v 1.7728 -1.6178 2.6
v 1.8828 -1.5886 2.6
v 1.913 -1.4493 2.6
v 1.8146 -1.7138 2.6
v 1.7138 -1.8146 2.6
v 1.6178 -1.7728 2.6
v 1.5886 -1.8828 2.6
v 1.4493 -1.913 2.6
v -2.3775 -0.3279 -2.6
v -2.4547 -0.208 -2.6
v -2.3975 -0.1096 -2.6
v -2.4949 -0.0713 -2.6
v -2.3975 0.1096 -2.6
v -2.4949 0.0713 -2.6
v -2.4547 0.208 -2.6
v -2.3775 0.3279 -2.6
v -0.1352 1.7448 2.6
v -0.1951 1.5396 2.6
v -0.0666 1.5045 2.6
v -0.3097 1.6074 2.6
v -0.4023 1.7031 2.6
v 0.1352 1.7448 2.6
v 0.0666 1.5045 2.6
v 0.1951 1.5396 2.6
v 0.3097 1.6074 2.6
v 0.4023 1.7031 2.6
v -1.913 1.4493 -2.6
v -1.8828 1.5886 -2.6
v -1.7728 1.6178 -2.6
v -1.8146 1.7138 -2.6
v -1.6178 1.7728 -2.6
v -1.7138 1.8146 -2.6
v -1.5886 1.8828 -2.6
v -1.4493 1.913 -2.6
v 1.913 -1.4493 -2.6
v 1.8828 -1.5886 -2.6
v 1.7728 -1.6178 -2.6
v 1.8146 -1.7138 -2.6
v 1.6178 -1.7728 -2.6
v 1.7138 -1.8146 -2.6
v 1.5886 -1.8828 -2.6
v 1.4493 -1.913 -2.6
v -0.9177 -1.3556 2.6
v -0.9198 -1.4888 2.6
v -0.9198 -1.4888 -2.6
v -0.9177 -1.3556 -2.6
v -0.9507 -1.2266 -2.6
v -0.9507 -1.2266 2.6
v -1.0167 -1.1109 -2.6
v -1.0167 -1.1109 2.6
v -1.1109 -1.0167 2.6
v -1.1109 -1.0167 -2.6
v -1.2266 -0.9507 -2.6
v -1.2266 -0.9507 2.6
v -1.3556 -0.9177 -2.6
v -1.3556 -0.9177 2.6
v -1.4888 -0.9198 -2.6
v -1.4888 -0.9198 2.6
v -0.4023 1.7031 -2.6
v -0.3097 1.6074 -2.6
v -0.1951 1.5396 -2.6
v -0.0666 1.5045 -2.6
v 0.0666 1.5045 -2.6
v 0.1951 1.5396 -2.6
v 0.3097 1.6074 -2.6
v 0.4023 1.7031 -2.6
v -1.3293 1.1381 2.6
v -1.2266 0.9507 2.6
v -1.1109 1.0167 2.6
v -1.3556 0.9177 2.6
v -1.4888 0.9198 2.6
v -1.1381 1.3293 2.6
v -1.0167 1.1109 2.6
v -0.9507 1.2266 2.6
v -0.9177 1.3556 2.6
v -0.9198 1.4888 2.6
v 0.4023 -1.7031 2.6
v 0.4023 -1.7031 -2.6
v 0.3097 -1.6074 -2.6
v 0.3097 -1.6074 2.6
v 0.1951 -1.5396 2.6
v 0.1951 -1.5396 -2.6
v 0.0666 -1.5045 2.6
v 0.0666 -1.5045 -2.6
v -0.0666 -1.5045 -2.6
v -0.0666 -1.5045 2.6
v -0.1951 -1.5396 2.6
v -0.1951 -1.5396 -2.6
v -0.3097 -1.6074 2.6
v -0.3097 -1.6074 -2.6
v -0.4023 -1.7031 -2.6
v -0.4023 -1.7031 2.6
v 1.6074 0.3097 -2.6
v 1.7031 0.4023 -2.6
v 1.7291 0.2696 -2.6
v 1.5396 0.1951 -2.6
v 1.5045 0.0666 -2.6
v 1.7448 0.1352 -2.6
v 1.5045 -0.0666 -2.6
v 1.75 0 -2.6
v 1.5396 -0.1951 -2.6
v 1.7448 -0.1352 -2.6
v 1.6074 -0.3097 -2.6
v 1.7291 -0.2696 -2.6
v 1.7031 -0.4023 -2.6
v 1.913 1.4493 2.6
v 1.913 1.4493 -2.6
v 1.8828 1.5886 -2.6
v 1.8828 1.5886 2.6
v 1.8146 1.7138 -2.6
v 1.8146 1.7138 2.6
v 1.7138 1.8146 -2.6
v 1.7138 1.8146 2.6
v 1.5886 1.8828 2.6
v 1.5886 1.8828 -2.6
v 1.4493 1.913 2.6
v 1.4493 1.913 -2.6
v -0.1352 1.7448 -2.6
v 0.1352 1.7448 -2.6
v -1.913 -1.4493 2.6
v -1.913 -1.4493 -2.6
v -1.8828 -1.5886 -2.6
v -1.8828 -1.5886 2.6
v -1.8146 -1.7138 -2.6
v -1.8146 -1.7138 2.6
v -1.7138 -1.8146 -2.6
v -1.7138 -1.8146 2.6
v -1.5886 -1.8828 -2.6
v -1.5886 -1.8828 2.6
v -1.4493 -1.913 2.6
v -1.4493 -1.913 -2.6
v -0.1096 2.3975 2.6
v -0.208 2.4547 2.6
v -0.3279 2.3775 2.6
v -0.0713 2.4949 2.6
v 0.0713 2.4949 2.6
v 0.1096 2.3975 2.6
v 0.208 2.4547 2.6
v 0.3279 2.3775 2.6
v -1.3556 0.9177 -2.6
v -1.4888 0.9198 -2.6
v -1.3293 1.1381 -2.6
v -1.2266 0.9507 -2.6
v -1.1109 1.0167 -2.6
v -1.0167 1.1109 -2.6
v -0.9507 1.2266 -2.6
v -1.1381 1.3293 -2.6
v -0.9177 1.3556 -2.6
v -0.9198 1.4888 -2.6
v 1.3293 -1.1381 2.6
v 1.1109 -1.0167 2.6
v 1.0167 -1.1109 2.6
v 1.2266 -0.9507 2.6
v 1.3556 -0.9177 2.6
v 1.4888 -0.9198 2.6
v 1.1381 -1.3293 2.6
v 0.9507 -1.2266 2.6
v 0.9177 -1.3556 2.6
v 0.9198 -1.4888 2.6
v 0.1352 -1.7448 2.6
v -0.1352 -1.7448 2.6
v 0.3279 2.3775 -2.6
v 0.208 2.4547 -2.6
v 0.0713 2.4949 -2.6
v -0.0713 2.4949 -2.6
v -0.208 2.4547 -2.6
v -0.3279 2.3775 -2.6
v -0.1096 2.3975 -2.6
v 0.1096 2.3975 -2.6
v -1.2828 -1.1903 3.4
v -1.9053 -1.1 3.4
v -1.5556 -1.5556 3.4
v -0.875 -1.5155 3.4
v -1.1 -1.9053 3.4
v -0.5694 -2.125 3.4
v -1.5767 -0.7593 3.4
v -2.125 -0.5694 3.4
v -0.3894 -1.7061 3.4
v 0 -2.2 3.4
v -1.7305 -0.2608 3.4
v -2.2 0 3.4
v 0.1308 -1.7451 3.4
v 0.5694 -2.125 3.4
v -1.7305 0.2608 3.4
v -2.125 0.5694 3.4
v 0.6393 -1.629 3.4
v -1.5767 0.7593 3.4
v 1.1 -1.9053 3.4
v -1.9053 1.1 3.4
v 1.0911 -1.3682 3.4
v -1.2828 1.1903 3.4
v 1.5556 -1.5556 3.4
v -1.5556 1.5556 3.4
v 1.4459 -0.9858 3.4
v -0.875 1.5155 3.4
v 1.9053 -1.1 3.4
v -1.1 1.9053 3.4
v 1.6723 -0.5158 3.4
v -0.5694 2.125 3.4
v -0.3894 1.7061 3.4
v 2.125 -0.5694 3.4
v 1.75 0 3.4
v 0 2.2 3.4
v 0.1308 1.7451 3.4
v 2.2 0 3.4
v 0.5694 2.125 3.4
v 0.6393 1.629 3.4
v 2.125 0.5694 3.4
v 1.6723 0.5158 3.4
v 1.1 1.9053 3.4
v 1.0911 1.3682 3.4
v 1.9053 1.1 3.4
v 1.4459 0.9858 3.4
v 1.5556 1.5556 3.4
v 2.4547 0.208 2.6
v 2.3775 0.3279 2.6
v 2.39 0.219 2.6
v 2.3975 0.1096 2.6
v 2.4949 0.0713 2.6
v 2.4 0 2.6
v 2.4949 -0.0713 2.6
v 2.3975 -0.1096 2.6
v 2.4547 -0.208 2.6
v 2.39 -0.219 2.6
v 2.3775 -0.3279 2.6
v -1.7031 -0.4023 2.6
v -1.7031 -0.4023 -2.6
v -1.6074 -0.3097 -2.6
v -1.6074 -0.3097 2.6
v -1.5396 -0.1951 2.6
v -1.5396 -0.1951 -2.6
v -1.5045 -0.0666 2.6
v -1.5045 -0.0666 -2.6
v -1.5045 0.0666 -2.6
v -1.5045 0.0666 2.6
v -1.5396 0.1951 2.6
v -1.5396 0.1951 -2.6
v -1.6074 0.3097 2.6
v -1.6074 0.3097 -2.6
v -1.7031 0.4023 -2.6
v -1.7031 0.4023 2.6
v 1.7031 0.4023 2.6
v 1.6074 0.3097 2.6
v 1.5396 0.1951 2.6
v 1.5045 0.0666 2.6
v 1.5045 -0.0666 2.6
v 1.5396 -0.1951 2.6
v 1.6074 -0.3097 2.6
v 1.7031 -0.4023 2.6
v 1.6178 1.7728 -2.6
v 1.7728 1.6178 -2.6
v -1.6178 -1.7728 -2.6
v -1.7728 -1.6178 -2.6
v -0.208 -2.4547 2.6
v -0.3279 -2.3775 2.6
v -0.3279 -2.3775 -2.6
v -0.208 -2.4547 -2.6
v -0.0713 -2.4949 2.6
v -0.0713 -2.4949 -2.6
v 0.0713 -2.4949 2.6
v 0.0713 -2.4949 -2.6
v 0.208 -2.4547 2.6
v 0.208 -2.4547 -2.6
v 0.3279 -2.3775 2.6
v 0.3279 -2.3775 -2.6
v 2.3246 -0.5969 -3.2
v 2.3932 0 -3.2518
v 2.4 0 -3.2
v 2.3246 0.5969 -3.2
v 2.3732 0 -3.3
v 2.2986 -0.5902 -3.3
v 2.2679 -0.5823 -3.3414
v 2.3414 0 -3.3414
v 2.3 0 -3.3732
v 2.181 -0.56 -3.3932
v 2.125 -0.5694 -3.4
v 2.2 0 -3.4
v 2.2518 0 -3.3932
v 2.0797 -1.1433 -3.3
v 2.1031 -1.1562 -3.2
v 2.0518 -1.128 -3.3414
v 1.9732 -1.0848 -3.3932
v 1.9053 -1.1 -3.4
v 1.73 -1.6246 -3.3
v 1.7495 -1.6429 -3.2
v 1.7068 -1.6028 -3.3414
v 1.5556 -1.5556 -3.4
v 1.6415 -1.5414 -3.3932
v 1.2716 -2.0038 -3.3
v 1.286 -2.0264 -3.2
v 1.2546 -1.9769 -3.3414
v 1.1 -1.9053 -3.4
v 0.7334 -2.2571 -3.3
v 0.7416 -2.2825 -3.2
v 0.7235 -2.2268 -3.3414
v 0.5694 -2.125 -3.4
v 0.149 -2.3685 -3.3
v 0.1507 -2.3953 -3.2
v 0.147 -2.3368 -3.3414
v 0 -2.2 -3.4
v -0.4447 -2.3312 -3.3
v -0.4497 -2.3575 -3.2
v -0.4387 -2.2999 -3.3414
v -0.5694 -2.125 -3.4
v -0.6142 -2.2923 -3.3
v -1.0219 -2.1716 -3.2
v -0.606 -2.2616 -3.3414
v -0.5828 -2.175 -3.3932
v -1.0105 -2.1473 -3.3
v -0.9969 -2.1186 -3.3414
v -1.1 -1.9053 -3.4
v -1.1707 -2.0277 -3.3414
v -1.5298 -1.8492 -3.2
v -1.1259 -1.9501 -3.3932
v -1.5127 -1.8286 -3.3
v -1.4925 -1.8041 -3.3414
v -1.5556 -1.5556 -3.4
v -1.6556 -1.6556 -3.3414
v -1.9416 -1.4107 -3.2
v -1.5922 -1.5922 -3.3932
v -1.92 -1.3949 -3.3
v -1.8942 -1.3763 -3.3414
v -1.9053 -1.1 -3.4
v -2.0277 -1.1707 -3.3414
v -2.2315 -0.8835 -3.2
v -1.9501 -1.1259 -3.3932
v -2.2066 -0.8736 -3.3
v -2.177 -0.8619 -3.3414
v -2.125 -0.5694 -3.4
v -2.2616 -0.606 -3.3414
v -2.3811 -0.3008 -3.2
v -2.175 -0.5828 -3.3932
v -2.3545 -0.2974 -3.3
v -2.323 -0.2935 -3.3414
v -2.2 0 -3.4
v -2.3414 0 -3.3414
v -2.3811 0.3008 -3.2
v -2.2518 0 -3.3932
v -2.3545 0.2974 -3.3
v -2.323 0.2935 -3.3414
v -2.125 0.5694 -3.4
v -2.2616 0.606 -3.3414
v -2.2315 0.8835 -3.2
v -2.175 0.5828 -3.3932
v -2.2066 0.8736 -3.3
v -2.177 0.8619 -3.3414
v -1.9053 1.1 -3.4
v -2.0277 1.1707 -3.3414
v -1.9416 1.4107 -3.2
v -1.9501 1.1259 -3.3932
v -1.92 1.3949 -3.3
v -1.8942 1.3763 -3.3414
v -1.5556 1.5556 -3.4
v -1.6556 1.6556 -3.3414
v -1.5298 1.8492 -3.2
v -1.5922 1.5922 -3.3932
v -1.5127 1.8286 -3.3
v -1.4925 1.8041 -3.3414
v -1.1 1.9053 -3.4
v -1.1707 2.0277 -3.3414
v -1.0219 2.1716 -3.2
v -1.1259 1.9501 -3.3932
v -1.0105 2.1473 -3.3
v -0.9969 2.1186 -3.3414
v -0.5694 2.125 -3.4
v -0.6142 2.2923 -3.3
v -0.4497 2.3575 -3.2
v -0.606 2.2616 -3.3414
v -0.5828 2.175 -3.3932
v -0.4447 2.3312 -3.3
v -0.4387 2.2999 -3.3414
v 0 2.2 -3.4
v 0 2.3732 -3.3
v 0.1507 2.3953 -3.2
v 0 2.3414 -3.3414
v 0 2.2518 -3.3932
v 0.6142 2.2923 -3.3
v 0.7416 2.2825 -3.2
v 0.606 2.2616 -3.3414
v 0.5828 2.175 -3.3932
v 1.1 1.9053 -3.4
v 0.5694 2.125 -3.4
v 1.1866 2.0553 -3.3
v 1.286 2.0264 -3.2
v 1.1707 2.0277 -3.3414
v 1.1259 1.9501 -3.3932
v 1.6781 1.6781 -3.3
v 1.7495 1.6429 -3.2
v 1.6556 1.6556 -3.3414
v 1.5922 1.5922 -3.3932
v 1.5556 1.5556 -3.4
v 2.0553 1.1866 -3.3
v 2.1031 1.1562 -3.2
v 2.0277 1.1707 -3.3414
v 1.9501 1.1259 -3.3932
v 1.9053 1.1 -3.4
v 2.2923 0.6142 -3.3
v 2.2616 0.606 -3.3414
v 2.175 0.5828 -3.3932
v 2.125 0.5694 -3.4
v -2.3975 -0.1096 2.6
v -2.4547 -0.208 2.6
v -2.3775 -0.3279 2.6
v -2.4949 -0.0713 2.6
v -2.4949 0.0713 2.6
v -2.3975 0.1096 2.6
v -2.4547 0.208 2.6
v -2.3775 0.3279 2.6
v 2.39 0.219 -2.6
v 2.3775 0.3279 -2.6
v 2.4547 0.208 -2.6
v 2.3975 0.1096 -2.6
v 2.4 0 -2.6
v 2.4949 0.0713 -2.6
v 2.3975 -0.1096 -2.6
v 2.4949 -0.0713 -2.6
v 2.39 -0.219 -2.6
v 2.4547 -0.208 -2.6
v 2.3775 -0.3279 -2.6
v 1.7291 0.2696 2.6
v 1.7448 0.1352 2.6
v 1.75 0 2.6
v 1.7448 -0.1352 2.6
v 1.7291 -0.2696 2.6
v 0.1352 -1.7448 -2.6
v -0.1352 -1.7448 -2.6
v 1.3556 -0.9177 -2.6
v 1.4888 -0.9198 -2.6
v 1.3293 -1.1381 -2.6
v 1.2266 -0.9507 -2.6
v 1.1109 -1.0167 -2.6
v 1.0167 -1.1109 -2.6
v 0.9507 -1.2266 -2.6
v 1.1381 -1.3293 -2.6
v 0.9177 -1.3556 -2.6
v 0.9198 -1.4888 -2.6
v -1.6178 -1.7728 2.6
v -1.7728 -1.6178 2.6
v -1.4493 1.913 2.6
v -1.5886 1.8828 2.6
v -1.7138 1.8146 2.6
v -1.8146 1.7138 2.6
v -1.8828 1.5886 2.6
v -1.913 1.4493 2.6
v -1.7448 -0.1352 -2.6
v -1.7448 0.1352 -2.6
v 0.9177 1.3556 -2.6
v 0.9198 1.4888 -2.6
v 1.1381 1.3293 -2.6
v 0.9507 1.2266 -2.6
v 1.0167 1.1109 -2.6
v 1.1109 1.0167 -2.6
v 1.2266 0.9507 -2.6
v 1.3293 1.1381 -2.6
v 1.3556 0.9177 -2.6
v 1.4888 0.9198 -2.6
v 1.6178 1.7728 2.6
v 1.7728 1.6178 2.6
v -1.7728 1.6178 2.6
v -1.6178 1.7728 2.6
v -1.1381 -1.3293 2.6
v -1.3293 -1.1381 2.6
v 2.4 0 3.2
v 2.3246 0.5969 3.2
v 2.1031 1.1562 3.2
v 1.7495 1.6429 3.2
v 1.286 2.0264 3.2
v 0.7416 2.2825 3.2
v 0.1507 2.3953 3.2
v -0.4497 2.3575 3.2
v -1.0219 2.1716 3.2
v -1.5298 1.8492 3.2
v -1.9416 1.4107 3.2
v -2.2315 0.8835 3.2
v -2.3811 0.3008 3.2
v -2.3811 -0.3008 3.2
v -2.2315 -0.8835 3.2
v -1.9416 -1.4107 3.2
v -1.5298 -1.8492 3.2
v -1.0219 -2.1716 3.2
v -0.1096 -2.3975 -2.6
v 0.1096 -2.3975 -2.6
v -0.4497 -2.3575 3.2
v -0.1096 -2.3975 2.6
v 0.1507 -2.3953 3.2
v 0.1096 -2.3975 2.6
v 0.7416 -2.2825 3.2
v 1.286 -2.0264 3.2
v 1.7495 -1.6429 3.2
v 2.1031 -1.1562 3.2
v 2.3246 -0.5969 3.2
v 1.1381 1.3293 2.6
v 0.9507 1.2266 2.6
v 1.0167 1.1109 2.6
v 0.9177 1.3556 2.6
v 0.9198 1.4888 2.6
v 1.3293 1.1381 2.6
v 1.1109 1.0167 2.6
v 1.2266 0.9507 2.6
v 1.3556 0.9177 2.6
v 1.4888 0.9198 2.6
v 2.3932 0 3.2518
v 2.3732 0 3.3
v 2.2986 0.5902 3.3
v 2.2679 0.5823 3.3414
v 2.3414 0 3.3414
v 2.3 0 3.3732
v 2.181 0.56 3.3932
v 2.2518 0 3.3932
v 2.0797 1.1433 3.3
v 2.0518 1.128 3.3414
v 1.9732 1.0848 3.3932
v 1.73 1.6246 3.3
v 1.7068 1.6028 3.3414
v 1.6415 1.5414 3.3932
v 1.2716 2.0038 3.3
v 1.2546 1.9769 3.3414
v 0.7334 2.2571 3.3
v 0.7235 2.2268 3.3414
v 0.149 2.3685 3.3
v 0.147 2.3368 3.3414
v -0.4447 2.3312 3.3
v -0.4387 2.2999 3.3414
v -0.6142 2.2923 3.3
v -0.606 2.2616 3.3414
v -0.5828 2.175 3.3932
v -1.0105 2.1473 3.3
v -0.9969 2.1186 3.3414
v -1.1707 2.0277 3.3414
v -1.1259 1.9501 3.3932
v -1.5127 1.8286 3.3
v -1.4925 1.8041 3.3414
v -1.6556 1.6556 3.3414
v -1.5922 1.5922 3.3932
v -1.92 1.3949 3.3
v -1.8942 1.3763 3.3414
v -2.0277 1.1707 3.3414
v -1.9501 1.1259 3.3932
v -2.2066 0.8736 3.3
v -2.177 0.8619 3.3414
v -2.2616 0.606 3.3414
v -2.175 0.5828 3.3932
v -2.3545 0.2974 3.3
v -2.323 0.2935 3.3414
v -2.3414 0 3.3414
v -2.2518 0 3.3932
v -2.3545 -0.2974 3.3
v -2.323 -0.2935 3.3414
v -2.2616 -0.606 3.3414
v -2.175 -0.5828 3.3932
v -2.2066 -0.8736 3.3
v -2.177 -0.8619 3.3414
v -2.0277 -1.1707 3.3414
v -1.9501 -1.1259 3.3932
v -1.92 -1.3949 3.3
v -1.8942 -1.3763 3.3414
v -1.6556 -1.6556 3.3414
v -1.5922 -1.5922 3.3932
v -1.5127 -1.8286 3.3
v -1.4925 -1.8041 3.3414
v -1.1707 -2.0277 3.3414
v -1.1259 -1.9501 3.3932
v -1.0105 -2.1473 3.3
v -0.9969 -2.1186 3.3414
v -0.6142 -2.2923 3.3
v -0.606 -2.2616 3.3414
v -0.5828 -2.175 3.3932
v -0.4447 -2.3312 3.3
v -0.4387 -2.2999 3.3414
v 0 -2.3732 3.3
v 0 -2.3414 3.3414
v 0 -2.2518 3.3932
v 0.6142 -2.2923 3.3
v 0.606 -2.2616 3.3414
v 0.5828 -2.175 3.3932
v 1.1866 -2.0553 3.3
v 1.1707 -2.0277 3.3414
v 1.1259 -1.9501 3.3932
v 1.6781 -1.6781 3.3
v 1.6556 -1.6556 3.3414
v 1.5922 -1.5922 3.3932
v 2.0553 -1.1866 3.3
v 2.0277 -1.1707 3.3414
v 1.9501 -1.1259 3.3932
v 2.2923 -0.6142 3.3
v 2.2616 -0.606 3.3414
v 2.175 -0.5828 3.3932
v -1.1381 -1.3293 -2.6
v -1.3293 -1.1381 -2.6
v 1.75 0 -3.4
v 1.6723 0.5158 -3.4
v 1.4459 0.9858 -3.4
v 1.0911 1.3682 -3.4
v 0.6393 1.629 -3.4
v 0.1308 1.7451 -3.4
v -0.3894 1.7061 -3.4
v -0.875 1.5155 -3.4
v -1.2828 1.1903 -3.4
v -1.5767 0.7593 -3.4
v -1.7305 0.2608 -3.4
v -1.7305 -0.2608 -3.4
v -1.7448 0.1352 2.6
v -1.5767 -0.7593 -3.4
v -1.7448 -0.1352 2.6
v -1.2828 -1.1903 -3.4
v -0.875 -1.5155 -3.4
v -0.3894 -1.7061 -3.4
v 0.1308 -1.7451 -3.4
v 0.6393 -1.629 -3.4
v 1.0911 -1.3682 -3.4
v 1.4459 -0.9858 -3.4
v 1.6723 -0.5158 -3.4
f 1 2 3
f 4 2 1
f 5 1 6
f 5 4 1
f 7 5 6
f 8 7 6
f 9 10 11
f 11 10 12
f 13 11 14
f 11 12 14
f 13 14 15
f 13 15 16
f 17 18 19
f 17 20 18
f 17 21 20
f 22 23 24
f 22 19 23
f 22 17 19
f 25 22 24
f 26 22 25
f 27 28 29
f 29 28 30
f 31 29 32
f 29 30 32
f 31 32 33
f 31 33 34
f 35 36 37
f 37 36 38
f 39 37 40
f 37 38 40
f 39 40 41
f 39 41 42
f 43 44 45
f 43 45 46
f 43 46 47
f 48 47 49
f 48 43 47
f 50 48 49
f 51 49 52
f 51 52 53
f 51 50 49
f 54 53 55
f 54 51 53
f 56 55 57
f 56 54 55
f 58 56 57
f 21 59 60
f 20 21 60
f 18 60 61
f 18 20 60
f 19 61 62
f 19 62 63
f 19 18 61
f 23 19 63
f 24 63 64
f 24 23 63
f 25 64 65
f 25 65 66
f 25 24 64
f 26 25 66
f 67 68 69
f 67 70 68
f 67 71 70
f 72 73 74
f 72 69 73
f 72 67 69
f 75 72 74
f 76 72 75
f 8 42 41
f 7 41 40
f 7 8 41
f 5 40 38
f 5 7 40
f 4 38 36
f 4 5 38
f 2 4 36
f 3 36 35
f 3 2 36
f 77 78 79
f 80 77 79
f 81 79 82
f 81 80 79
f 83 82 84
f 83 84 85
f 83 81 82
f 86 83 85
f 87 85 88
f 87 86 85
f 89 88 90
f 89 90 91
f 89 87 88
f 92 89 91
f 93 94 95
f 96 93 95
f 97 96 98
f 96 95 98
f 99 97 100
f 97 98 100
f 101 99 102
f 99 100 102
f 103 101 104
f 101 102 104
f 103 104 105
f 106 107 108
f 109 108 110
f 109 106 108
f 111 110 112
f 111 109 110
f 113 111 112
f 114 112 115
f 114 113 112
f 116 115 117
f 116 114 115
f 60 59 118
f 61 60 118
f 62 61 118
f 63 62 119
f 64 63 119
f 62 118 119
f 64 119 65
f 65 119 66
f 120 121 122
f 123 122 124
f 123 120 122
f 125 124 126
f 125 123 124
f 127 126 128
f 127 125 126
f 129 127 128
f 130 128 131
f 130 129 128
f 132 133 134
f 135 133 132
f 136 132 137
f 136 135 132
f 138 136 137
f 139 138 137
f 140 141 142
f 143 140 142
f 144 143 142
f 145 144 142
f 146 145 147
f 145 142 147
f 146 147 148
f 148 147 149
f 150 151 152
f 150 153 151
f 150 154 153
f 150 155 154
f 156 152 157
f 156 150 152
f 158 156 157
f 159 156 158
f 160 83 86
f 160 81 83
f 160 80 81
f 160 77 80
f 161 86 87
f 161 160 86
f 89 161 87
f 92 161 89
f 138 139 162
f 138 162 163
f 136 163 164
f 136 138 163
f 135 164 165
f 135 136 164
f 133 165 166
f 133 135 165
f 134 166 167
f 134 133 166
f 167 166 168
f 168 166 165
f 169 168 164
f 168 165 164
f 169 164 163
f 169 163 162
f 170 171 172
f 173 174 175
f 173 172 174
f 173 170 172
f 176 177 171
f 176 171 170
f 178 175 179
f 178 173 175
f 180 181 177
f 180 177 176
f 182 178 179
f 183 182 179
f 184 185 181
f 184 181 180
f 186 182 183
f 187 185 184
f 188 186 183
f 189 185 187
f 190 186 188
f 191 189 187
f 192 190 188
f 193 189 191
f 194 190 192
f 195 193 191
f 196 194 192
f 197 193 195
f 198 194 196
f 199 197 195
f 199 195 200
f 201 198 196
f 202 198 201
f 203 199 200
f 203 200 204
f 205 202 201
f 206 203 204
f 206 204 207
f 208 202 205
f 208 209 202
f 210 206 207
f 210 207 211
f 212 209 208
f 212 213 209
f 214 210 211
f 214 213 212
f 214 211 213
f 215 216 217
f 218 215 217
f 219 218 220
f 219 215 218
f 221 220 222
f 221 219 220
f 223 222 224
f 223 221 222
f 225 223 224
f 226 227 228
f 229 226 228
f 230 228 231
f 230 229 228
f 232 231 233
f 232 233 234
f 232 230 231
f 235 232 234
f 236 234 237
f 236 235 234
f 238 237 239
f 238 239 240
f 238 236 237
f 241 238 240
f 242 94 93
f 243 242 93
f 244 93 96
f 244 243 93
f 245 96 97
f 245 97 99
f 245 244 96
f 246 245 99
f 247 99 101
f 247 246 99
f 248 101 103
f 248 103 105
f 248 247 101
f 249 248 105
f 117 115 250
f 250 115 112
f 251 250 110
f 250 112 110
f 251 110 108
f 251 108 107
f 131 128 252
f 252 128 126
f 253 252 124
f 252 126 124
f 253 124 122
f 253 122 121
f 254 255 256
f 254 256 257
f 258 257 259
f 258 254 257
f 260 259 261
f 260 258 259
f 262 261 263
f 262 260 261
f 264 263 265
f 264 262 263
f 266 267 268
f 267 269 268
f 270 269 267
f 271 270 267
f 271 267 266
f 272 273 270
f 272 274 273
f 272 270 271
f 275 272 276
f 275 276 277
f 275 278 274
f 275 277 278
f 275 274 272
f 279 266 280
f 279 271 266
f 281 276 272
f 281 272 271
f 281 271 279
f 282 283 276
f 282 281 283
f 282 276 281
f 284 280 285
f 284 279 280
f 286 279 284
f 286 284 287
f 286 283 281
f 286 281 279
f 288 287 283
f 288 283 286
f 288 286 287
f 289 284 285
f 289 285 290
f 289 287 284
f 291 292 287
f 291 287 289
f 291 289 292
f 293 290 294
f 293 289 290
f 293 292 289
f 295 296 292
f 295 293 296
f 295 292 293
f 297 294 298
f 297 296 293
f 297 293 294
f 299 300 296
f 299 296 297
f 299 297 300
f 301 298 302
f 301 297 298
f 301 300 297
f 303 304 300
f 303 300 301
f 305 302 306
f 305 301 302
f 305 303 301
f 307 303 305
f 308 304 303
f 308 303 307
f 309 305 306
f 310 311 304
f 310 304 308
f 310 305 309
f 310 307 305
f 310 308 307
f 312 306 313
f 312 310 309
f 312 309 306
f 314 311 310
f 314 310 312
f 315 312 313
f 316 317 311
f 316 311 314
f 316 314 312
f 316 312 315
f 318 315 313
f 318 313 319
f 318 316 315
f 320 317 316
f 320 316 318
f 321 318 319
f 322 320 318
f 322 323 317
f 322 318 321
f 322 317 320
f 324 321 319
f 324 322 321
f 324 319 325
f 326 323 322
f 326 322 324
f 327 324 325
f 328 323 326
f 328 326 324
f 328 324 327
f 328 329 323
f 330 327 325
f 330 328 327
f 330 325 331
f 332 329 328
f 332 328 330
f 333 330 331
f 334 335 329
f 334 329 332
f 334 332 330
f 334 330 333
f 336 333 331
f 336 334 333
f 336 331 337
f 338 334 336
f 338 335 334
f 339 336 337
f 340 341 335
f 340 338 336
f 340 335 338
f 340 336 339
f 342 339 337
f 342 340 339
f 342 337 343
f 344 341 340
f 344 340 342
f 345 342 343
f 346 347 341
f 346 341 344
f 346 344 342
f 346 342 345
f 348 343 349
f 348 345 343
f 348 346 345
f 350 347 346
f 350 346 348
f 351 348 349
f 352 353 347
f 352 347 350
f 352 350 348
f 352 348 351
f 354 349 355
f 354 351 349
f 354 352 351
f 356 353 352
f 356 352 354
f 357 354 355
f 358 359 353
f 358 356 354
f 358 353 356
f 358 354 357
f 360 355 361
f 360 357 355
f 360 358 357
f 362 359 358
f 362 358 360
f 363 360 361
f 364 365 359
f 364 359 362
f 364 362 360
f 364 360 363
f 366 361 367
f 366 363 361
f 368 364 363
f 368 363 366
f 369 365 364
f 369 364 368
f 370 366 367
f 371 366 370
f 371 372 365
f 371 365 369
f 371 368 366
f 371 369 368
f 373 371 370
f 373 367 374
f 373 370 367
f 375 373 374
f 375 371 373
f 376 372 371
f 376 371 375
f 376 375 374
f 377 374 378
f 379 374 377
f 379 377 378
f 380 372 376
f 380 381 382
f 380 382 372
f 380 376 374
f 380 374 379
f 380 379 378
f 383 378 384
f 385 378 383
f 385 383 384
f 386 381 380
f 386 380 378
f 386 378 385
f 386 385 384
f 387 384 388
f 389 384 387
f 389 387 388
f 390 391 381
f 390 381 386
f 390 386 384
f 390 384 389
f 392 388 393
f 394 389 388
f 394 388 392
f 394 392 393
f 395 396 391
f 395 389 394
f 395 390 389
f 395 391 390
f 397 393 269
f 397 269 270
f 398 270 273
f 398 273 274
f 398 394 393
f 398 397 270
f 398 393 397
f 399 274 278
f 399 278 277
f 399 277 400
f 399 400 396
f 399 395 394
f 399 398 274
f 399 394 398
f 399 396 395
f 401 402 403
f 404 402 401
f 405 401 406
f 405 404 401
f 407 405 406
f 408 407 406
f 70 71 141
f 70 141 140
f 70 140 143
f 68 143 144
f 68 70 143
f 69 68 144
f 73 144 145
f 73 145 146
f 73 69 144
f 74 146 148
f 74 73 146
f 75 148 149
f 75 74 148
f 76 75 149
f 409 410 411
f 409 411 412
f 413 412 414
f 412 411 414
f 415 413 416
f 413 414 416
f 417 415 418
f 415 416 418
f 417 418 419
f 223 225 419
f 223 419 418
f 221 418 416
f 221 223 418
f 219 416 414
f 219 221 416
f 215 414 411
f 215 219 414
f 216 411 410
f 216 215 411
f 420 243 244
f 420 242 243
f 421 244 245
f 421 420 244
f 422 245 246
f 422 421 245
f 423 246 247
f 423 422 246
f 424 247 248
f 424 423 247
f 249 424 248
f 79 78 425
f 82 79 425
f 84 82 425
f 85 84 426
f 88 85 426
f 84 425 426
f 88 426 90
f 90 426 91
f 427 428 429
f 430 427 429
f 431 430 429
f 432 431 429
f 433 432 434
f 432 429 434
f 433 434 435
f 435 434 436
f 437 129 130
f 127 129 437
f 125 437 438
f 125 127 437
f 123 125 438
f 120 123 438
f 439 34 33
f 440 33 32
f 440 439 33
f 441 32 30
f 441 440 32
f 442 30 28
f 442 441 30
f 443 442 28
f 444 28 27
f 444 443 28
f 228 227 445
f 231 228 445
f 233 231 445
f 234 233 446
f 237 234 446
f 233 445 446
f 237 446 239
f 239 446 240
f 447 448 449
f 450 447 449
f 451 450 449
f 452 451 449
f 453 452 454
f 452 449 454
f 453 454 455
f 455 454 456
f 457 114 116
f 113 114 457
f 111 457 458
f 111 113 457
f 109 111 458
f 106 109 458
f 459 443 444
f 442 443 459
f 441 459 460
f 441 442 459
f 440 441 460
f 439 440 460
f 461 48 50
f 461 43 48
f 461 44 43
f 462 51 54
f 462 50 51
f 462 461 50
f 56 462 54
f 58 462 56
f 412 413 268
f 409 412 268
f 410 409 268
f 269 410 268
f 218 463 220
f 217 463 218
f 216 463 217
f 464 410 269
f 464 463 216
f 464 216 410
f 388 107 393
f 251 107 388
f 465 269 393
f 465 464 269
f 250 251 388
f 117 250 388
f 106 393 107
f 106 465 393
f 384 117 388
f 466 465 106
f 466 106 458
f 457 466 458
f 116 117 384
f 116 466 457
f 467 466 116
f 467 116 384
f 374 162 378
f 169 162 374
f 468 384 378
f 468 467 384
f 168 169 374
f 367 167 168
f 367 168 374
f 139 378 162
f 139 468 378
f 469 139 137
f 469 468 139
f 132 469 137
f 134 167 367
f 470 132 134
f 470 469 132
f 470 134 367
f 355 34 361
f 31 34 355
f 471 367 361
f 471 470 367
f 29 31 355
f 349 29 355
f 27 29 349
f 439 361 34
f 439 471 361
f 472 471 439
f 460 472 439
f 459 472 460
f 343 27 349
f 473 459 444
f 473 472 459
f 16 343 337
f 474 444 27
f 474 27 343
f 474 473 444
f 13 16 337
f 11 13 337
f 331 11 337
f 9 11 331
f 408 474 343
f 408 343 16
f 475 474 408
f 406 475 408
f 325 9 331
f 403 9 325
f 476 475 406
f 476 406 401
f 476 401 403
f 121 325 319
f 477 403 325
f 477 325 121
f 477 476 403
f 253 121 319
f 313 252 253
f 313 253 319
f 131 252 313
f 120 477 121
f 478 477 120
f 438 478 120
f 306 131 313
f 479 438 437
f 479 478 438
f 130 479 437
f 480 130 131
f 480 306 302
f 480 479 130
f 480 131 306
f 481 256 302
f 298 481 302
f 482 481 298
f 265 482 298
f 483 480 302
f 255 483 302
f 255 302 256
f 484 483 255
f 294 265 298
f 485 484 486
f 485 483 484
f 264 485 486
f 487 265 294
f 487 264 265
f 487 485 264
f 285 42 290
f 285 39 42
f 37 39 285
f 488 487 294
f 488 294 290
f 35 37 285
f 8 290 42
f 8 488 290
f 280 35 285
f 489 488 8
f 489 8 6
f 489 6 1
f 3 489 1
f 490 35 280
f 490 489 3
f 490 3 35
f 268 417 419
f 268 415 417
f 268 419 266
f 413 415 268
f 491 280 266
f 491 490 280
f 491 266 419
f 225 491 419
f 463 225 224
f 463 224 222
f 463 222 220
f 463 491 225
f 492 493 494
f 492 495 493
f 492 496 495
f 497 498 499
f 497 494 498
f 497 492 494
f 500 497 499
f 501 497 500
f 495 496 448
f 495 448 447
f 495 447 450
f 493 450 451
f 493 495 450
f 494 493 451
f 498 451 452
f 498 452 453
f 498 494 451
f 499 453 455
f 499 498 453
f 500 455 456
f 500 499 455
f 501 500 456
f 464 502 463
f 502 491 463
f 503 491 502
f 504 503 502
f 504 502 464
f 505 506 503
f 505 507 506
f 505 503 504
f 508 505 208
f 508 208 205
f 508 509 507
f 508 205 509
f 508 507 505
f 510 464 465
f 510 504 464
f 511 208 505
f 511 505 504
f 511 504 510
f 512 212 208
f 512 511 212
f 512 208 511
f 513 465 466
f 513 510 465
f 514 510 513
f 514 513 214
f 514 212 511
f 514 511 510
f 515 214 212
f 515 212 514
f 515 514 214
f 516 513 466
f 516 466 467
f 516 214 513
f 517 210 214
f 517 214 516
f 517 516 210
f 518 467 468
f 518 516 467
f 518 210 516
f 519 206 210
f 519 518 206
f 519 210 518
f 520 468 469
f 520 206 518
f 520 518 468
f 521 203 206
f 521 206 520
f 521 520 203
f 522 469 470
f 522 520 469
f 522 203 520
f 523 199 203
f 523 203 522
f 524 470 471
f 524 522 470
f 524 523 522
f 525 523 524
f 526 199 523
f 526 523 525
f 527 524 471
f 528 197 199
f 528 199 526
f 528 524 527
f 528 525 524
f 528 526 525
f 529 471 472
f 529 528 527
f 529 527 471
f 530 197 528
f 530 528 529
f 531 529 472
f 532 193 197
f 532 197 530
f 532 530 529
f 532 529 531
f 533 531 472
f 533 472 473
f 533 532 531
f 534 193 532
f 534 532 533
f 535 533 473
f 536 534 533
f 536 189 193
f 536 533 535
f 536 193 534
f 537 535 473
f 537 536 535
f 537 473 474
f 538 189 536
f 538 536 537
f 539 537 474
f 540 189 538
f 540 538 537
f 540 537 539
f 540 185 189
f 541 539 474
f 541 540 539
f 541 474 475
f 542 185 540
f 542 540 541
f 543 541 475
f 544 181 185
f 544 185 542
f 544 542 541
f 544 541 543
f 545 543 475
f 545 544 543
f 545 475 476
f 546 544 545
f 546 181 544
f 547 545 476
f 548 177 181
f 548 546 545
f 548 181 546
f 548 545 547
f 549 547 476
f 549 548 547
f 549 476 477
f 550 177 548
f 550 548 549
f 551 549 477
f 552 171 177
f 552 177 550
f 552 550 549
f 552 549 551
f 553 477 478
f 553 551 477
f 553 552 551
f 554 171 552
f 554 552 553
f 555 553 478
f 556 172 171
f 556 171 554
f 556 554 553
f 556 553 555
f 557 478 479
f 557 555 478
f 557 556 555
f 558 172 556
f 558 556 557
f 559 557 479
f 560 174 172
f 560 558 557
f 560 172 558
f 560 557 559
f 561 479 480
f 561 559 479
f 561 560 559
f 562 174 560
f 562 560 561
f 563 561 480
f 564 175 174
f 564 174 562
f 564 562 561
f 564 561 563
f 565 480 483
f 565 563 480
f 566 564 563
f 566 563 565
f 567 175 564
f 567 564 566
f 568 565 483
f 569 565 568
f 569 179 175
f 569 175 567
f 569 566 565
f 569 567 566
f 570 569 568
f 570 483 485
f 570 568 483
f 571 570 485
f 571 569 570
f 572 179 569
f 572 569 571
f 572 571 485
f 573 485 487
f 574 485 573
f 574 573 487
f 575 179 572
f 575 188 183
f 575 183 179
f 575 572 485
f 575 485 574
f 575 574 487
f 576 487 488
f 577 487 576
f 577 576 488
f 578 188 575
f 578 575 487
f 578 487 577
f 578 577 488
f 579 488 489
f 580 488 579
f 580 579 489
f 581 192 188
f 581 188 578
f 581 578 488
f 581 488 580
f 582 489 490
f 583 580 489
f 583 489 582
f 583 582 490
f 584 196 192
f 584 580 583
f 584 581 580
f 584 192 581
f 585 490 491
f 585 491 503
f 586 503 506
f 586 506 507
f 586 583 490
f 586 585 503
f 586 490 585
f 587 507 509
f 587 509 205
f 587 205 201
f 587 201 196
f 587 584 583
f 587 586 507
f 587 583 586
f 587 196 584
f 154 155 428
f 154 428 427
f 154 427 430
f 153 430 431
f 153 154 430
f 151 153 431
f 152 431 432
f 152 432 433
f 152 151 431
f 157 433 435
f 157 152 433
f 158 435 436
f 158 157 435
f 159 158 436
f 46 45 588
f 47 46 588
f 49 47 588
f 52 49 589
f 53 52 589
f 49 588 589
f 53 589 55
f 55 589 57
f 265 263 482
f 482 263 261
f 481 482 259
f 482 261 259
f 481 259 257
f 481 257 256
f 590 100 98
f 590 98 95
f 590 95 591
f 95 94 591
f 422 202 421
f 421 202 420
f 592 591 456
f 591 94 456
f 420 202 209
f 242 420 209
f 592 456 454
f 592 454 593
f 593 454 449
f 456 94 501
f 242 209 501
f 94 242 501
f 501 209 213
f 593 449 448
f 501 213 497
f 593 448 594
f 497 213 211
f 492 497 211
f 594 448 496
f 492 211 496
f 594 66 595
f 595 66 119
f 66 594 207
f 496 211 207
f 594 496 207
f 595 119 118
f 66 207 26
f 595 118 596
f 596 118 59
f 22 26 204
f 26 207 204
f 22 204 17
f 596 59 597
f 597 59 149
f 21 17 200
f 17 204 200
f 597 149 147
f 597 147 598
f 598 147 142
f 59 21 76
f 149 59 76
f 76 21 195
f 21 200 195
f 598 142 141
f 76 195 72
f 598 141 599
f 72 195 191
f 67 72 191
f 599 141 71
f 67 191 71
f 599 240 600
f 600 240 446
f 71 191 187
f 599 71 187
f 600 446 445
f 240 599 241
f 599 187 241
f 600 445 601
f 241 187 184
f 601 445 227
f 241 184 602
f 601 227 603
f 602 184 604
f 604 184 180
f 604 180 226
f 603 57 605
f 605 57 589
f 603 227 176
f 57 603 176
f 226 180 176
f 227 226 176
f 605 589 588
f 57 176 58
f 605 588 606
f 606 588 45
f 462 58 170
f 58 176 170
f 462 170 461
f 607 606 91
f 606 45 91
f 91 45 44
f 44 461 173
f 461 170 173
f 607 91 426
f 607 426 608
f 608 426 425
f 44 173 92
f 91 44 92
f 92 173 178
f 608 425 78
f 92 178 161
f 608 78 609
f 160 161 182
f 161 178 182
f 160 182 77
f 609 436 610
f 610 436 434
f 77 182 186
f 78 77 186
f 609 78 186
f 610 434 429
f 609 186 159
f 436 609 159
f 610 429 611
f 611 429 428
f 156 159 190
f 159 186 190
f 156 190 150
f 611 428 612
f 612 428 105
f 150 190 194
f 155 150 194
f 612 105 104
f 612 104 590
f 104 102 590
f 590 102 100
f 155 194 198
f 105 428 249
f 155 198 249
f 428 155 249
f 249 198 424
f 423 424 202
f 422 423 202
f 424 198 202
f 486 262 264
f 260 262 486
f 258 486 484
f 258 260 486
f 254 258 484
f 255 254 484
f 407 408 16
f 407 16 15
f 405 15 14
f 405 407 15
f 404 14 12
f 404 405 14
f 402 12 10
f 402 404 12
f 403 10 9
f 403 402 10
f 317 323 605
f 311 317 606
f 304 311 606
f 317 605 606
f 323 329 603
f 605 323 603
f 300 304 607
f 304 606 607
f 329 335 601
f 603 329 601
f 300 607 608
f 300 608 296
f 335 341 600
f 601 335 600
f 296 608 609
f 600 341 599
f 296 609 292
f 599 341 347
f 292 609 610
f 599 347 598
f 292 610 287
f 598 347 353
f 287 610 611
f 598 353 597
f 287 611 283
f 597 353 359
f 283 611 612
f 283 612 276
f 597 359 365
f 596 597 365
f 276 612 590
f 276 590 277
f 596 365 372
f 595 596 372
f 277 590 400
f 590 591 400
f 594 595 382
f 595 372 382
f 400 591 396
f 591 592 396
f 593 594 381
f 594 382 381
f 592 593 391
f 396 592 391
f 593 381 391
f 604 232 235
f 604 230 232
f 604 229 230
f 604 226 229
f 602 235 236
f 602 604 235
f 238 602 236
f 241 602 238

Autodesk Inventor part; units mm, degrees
ref_plane "YZ Plane" through (0, 0, 0) normal (1, 0, 0) x (0, 1, 0)
ref_plane "XZ Plane" through (0, 0, 0) normal (0, 1, 0) x (-1, 0, 0)
ref_plane "XY Plane" through (0, 0, 0) normal (0, 0, 1) x (1, 0, 0)
sketch "Эскиз1" plane through (0, 0, 0) normal (0, 0, 1) x (1, 0, 0)
  circle A0 centre (0, 0) radius 2.4
  circle A1 centre (0, 0) radius 1.75
  circle A2 centre (0, 0) radius 1.5
  circle A3 centre (0, 0) radius 2.5
  line L0 (0, 0) -> (0, 4) construction
  circle A4 centre (0, 2) radius 0.5
  dimension "d0" = 4.8
  dimension "d1" = 3.5
  dimension "d2" = 3
  dimension "d3" = 5
extrude "Выдавливание1" add sketch "Эскиз1" along normal mid plane 6.8 contours A0 A4 A1 | A4 A1 A0
extrude "Выдавливание2" add sketch "Эскиз1" along normal mid plane 5.2 contours A4 A1 A0 | A0 A4 | A1 A4 picked at (-0.2377, 2.1059) picked at (0, 1.6632)
pattern_circular "Круговой массив1" count 8 over 360 about axis through (0, 0, 0) along (0, 0, 1) of "Выдавливание2"
fillet "Сопряжение1" radius 0.2 2 edges at (-2.4, 0, 3.4) (-2.4, 0, -3.4)
properties part number "роликовый подшипник"
